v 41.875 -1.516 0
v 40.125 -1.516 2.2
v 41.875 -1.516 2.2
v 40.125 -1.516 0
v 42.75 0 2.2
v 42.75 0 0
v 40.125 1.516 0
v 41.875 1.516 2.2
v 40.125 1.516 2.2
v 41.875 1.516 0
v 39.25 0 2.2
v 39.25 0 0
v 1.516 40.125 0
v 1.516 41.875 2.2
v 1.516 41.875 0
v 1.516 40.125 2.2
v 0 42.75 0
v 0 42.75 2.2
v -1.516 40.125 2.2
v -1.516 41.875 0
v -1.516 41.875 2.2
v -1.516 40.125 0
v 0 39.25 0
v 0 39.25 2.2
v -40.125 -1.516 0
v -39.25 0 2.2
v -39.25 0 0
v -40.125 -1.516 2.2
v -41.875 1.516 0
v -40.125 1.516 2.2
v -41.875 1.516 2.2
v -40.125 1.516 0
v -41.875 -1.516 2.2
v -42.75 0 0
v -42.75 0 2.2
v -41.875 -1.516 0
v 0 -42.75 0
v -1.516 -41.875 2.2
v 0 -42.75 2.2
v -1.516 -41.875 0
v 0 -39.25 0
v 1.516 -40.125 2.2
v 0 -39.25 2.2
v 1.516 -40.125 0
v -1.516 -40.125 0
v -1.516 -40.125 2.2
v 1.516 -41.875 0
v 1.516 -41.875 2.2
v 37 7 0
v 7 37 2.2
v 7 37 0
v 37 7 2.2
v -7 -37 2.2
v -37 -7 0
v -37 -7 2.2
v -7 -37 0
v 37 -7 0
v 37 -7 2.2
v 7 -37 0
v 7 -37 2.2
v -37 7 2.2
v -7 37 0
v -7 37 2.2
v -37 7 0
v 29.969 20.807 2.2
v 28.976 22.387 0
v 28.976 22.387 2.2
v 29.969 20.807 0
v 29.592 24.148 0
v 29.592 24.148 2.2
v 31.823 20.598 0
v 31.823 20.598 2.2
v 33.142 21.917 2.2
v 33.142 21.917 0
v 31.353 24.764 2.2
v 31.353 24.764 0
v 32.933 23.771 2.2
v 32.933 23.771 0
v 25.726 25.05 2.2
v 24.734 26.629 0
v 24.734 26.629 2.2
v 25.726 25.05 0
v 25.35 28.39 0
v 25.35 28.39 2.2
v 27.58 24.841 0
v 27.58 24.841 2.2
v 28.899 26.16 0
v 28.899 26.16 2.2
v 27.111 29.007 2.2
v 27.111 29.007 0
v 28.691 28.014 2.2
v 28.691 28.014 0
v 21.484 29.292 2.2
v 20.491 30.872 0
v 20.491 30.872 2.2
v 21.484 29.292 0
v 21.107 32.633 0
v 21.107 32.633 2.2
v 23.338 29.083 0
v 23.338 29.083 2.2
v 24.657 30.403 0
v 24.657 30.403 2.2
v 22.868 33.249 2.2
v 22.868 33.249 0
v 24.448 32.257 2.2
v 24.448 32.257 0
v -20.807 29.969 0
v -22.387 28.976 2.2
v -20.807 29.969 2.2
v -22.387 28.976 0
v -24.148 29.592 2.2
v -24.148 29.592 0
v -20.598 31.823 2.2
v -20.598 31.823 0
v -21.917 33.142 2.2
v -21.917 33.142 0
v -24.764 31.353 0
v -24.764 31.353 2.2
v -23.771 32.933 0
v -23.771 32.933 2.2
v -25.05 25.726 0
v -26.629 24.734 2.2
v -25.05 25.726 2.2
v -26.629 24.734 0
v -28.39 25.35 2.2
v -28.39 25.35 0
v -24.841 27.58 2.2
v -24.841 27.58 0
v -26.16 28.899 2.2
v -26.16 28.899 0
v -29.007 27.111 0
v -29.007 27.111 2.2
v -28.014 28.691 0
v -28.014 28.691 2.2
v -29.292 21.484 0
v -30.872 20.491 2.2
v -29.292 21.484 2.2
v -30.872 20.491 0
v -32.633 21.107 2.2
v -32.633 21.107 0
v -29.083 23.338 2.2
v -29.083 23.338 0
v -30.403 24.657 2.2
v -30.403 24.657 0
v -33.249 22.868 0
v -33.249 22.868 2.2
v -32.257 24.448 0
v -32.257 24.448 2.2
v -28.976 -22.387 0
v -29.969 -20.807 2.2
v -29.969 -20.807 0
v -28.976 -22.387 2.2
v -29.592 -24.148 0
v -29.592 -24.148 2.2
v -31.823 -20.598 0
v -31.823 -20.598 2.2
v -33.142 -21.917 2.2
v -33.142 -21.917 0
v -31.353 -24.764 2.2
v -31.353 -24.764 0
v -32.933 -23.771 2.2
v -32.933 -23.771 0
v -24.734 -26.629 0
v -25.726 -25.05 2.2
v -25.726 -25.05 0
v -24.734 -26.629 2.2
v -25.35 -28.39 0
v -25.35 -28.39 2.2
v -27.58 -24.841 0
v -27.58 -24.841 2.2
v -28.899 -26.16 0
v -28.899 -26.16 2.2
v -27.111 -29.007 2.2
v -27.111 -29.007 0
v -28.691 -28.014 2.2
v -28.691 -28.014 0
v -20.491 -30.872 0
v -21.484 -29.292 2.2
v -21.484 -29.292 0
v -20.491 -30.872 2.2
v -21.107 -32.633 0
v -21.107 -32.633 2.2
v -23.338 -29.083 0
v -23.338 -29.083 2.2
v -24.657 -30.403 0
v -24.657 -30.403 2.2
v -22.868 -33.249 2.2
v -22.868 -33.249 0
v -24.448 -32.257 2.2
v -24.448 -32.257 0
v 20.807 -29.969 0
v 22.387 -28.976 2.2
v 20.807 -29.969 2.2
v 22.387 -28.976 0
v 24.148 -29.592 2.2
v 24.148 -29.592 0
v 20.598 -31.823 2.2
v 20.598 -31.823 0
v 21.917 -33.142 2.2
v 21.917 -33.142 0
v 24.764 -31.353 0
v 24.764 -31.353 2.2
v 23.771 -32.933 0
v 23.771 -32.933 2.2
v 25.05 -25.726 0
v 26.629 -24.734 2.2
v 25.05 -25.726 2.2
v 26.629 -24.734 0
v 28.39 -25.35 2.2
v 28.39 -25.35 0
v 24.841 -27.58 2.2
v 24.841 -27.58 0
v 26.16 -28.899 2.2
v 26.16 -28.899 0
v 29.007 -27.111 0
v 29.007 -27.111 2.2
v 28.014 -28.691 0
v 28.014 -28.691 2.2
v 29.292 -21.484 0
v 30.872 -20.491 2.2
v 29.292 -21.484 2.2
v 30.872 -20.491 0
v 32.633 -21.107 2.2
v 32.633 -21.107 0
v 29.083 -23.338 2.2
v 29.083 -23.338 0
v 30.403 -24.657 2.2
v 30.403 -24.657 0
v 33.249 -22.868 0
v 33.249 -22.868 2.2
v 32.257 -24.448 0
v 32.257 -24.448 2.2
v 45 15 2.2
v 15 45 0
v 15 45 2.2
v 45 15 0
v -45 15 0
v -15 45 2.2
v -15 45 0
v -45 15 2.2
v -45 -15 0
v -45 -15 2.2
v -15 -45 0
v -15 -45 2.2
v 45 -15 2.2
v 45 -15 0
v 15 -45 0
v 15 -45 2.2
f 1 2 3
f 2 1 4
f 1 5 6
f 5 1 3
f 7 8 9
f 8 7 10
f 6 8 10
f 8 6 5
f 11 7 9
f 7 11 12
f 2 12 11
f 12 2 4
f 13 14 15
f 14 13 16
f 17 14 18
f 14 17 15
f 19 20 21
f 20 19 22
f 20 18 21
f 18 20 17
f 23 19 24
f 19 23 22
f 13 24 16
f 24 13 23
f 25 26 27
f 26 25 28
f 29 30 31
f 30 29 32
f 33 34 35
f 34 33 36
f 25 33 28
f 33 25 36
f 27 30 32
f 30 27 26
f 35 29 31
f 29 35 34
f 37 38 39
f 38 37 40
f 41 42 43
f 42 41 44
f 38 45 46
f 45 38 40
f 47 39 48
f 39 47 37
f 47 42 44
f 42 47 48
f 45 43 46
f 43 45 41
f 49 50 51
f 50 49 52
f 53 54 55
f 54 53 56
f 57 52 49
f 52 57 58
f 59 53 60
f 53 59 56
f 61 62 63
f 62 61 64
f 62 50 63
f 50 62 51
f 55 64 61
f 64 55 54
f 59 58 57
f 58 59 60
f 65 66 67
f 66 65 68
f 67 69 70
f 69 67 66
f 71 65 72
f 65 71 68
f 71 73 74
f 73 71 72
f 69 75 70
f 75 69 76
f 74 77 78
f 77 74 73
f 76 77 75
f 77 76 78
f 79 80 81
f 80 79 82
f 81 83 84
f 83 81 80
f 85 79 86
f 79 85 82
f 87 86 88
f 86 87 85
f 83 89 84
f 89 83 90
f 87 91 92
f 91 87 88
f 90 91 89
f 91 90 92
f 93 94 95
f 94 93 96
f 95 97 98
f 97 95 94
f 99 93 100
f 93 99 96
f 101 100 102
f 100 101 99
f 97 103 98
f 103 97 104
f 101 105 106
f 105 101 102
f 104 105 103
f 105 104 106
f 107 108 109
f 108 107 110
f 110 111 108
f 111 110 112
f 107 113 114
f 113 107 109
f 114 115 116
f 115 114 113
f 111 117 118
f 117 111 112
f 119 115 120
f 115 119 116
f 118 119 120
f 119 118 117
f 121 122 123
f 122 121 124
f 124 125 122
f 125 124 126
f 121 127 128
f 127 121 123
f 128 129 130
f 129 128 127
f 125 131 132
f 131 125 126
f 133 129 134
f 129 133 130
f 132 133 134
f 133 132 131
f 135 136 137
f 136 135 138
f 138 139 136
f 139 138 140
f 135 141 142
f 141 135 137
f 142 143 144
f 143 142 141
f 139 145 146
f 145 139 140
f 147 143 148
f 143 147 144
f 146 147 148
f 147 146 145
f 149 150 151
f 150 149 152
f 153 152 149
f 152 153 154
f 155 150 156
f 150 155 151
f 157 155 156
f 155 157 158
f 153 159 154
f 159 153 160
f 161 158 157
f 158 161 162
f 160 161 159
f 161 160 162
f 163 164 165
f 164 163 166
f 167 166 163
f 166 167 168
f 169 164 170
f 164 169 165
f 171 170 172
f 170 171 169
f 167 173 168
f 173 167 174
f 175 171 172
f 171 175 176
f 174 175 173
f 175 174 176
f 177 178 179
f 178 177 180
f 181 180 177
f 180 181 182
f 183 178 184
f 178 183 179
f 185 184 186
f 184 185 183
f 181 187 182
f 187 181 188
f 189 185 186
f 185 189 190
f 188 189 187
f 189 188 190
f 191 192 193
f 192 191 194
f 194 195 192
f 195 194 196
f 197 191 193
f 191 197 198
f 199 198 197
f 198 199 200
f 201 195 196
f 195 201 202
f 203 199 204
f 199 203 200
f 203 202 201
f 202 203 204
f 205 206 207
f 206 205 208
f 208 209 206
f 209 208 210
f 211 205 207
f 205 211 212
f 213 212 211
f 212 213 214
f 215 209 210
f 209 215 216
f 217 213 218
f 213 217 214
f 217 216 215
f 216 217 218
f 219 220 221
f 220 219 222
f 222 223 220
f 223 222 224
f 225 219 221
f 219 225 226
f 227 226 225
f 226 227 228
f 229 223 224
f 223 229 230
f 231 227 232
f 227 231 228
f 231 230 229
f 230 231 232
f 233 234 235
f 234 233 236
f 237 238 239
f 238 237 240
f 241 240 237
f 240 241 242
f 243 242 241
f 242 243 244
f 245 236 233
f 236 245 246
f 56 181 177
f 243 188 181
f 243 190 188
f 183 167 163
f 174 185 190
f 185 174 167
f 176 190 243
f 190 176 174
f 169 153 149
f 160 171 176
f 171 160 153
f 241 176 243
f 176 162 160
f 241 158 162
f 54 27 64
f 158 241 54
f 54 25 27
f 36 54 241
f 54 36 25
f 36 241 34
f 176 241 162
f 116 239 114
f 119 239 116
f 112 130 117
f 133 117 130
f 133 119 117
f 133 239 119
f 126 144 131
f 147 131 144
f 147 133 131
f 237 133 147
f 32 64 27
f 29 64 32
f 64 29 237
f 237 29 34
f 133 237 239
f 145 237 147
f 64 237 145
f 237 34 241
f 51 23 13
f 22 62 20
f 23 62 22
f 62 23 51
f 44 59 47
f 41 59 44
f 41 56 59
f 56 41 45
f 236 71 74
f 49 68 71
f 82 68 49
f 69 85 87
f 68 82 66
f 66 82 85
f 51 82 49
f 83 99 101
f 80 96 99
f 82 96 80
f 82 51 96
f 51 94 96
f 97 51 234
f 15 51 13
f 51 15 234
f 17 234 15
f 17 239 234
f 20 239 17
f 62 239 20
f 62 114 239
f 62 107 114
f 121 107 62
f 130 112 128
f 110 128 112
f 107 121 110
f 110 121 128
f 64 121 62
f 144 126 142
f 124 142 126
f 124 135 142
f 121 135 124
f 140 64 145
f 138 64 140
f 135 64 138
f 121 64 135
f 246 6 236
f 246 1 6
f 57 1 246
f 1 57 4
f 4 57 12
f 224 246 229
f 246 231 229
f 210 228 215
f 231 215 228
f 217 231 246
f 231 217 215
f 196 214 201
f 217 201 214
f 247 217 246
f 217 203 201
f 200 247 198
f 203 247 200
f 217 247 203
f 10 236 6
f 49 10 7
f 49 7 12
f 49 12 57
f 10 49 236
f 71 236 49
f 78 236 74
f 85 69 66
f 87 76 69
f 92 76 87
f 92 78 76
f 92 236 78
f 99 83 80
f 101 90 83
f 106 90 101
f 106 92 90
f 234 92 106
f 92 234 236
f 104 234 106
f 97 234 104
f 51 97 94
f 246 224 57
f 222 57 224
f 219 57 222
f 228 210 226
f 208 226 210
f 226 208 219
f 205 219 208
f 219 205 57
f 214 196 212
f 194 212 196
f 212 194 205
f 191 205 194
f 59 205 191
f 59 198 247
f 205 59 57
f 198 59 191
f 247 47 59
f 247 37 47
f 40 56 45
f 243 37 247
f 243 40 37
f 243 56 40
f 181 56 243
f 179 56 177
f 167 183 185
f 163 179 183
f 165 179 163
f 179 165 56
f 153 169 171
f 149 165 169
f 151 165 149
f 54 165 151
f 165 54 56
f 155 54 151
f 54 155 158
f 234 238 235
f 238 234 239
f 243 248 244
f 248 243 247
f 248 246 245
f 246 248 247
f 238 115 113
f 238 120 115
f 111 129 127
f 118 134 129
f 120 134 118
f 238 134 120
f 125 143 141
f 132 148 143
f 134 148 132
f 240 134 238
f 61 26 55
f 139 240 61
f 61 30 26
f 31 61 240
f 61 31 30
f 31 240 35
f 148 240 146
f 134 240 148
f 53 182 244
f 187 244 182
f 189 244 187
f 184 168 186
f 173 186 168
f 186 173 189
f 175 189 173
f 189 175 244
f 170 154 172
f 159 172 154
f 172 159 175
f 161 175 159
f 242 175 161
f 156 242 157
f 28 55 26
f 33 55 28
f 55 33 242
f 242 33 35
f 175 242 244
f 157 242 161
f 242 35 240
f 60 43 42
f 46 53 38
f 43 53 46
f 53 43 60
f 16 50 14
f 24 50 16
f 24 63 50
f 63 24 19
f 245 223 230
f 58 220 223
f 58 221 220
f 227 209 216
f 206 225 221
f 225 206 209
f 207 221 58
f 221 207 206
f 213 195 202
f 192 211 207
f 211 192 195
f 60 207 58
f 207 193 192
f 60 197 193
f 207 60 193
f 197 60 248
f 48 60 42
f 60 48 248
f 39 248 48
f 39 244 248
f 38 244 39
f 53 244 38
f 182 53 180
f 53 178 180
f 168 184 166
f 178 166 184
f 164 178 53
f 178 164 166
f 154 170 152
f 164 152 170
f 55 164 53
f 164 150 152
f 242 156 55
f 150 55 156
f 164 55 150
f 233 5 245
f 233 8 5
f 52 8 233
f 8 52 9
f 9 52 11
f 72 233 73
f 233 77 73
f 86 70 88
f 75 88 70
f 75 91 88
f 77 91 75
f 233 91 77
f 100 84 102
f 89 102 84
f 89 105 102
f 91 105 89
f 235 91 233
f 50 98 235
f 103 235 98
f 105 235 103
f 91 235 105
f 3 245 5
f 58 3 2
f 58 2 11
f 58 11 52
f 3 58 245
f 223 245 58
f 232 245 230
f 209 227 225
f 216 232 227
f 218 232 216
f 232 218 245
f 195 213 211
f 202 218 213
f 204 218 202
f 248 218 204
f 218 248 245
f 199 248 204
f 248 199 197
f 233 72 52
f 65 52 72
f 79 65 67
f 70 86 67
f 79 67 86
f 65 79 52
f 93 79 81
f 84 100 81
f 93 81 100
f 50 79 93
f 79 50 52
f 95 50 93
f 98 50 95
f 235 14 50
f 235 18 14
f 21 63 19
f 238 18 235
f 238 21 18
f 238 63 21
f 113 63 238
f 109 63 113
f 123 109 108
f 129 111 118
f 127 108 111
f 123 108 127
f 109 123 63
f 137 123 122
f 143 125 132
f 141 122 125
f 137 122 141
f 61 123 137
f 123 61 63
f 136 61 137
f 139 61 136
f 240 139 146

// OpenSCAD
// file: ../models/ollo.scad
Collisions=false;

// Diameter of plastic ollo holes
OlloHoles = 4.3;

// Width of Ollo "real" plastic
OlloWidth = 3;

// Distance between two ollo holes
OlloSpacing = 6;

module rivet()
{
    //:BOM "Ollo rivet" 0.05 http://www.robotis-shop-en.com/?act=shop_en.goods_view&GS=1605
}

// Do an Ollo hole on the part
module olloHole(depth=2.2, rivet=true)
{
    if (!Collisions) {
        if (rivet) {
	    rivet();
        }
        translate([0,0,-0.1])
            cylinder(depth+0.2, OlloHoles/2, OlloHoles/2);
    }	    
}

// Do 3 ollo holes
module threeOllo(depth=2.2, rivets=true)
{
    for (xy=[[-OlloSpacing,0],[0,0],[OlloSpacing,0]]) {
        translate([xy[0], xy[1], 0])
            olloHole(depth, rivets);
    }
}

// Do a servo arm holes
module servoArm(depth=2.2, rivets=true)
{
    if (rivets) {
        for (i=[1:5]) {
	    rivet();
	}
    }
    threeOllo(depth, false);
    rotate([0,0,90])
        threeOllo(depth, false);
}
// main file
use <../models/ollo.scad>;

//:Part
module metabotv2_body_plate(thickness=2.2, type="top", print=false) {
    // The layout path
    X=45;
    Y=15;

    module octopath(X, Y, thickness, center=false)
    {
        union() {
            linear_extrude(thickness, center=center)
                polygon(points=[
                        [X, Y], [X, -Y], 
                        [Y, -X], [-Y, -X],
                        [-X, -Y], [-X, Y],
                        [-Y, X], [Y, X], 
                ]);
        }
    }

    module hole3()
    {
        cylinder(d=3.5, h=99, center=true);
    }

    module repeat4()
    {
        for (r=[0:3])
        rotate([0,0,90*r])
        children();
    }

    difference() {
        // Making the exernal path
        octopath(X, Y, thickness=thickness);

        if (type == "top") {
            // Craving the board to make it accessible
            octopath(X-8, Y-8, thickness=99, center=true);

            // Adding holes for the magnets
            repeat4()
                translate([41,0,0])
                hole3();
        } else if (type == "bottom") {
            // Adding holes for the XBoard
            repeat4()
                translate([35, 11.5, 0])
                hole3();
        }

        // Motors fixation
        repeat4()
            rotate([0,0,45])
            translate([38,0,0])
            rotate([0,0,90])
            threeOllo(thickness);
    }

    if (type == "bottom") {
        // GP-2 fixation
        translate([X,0,5.5])
            difference() {
                cube([thickness, 44, 11], center=true);

                translate([0,-37/2,2])
                    rotate([0,90,0])
                    hole3();

                translate([0,37/2,2])
                    rotate([0,90,0])
                    hole3();

            }
    }
}

metabotv2_body_plate(type="top");
